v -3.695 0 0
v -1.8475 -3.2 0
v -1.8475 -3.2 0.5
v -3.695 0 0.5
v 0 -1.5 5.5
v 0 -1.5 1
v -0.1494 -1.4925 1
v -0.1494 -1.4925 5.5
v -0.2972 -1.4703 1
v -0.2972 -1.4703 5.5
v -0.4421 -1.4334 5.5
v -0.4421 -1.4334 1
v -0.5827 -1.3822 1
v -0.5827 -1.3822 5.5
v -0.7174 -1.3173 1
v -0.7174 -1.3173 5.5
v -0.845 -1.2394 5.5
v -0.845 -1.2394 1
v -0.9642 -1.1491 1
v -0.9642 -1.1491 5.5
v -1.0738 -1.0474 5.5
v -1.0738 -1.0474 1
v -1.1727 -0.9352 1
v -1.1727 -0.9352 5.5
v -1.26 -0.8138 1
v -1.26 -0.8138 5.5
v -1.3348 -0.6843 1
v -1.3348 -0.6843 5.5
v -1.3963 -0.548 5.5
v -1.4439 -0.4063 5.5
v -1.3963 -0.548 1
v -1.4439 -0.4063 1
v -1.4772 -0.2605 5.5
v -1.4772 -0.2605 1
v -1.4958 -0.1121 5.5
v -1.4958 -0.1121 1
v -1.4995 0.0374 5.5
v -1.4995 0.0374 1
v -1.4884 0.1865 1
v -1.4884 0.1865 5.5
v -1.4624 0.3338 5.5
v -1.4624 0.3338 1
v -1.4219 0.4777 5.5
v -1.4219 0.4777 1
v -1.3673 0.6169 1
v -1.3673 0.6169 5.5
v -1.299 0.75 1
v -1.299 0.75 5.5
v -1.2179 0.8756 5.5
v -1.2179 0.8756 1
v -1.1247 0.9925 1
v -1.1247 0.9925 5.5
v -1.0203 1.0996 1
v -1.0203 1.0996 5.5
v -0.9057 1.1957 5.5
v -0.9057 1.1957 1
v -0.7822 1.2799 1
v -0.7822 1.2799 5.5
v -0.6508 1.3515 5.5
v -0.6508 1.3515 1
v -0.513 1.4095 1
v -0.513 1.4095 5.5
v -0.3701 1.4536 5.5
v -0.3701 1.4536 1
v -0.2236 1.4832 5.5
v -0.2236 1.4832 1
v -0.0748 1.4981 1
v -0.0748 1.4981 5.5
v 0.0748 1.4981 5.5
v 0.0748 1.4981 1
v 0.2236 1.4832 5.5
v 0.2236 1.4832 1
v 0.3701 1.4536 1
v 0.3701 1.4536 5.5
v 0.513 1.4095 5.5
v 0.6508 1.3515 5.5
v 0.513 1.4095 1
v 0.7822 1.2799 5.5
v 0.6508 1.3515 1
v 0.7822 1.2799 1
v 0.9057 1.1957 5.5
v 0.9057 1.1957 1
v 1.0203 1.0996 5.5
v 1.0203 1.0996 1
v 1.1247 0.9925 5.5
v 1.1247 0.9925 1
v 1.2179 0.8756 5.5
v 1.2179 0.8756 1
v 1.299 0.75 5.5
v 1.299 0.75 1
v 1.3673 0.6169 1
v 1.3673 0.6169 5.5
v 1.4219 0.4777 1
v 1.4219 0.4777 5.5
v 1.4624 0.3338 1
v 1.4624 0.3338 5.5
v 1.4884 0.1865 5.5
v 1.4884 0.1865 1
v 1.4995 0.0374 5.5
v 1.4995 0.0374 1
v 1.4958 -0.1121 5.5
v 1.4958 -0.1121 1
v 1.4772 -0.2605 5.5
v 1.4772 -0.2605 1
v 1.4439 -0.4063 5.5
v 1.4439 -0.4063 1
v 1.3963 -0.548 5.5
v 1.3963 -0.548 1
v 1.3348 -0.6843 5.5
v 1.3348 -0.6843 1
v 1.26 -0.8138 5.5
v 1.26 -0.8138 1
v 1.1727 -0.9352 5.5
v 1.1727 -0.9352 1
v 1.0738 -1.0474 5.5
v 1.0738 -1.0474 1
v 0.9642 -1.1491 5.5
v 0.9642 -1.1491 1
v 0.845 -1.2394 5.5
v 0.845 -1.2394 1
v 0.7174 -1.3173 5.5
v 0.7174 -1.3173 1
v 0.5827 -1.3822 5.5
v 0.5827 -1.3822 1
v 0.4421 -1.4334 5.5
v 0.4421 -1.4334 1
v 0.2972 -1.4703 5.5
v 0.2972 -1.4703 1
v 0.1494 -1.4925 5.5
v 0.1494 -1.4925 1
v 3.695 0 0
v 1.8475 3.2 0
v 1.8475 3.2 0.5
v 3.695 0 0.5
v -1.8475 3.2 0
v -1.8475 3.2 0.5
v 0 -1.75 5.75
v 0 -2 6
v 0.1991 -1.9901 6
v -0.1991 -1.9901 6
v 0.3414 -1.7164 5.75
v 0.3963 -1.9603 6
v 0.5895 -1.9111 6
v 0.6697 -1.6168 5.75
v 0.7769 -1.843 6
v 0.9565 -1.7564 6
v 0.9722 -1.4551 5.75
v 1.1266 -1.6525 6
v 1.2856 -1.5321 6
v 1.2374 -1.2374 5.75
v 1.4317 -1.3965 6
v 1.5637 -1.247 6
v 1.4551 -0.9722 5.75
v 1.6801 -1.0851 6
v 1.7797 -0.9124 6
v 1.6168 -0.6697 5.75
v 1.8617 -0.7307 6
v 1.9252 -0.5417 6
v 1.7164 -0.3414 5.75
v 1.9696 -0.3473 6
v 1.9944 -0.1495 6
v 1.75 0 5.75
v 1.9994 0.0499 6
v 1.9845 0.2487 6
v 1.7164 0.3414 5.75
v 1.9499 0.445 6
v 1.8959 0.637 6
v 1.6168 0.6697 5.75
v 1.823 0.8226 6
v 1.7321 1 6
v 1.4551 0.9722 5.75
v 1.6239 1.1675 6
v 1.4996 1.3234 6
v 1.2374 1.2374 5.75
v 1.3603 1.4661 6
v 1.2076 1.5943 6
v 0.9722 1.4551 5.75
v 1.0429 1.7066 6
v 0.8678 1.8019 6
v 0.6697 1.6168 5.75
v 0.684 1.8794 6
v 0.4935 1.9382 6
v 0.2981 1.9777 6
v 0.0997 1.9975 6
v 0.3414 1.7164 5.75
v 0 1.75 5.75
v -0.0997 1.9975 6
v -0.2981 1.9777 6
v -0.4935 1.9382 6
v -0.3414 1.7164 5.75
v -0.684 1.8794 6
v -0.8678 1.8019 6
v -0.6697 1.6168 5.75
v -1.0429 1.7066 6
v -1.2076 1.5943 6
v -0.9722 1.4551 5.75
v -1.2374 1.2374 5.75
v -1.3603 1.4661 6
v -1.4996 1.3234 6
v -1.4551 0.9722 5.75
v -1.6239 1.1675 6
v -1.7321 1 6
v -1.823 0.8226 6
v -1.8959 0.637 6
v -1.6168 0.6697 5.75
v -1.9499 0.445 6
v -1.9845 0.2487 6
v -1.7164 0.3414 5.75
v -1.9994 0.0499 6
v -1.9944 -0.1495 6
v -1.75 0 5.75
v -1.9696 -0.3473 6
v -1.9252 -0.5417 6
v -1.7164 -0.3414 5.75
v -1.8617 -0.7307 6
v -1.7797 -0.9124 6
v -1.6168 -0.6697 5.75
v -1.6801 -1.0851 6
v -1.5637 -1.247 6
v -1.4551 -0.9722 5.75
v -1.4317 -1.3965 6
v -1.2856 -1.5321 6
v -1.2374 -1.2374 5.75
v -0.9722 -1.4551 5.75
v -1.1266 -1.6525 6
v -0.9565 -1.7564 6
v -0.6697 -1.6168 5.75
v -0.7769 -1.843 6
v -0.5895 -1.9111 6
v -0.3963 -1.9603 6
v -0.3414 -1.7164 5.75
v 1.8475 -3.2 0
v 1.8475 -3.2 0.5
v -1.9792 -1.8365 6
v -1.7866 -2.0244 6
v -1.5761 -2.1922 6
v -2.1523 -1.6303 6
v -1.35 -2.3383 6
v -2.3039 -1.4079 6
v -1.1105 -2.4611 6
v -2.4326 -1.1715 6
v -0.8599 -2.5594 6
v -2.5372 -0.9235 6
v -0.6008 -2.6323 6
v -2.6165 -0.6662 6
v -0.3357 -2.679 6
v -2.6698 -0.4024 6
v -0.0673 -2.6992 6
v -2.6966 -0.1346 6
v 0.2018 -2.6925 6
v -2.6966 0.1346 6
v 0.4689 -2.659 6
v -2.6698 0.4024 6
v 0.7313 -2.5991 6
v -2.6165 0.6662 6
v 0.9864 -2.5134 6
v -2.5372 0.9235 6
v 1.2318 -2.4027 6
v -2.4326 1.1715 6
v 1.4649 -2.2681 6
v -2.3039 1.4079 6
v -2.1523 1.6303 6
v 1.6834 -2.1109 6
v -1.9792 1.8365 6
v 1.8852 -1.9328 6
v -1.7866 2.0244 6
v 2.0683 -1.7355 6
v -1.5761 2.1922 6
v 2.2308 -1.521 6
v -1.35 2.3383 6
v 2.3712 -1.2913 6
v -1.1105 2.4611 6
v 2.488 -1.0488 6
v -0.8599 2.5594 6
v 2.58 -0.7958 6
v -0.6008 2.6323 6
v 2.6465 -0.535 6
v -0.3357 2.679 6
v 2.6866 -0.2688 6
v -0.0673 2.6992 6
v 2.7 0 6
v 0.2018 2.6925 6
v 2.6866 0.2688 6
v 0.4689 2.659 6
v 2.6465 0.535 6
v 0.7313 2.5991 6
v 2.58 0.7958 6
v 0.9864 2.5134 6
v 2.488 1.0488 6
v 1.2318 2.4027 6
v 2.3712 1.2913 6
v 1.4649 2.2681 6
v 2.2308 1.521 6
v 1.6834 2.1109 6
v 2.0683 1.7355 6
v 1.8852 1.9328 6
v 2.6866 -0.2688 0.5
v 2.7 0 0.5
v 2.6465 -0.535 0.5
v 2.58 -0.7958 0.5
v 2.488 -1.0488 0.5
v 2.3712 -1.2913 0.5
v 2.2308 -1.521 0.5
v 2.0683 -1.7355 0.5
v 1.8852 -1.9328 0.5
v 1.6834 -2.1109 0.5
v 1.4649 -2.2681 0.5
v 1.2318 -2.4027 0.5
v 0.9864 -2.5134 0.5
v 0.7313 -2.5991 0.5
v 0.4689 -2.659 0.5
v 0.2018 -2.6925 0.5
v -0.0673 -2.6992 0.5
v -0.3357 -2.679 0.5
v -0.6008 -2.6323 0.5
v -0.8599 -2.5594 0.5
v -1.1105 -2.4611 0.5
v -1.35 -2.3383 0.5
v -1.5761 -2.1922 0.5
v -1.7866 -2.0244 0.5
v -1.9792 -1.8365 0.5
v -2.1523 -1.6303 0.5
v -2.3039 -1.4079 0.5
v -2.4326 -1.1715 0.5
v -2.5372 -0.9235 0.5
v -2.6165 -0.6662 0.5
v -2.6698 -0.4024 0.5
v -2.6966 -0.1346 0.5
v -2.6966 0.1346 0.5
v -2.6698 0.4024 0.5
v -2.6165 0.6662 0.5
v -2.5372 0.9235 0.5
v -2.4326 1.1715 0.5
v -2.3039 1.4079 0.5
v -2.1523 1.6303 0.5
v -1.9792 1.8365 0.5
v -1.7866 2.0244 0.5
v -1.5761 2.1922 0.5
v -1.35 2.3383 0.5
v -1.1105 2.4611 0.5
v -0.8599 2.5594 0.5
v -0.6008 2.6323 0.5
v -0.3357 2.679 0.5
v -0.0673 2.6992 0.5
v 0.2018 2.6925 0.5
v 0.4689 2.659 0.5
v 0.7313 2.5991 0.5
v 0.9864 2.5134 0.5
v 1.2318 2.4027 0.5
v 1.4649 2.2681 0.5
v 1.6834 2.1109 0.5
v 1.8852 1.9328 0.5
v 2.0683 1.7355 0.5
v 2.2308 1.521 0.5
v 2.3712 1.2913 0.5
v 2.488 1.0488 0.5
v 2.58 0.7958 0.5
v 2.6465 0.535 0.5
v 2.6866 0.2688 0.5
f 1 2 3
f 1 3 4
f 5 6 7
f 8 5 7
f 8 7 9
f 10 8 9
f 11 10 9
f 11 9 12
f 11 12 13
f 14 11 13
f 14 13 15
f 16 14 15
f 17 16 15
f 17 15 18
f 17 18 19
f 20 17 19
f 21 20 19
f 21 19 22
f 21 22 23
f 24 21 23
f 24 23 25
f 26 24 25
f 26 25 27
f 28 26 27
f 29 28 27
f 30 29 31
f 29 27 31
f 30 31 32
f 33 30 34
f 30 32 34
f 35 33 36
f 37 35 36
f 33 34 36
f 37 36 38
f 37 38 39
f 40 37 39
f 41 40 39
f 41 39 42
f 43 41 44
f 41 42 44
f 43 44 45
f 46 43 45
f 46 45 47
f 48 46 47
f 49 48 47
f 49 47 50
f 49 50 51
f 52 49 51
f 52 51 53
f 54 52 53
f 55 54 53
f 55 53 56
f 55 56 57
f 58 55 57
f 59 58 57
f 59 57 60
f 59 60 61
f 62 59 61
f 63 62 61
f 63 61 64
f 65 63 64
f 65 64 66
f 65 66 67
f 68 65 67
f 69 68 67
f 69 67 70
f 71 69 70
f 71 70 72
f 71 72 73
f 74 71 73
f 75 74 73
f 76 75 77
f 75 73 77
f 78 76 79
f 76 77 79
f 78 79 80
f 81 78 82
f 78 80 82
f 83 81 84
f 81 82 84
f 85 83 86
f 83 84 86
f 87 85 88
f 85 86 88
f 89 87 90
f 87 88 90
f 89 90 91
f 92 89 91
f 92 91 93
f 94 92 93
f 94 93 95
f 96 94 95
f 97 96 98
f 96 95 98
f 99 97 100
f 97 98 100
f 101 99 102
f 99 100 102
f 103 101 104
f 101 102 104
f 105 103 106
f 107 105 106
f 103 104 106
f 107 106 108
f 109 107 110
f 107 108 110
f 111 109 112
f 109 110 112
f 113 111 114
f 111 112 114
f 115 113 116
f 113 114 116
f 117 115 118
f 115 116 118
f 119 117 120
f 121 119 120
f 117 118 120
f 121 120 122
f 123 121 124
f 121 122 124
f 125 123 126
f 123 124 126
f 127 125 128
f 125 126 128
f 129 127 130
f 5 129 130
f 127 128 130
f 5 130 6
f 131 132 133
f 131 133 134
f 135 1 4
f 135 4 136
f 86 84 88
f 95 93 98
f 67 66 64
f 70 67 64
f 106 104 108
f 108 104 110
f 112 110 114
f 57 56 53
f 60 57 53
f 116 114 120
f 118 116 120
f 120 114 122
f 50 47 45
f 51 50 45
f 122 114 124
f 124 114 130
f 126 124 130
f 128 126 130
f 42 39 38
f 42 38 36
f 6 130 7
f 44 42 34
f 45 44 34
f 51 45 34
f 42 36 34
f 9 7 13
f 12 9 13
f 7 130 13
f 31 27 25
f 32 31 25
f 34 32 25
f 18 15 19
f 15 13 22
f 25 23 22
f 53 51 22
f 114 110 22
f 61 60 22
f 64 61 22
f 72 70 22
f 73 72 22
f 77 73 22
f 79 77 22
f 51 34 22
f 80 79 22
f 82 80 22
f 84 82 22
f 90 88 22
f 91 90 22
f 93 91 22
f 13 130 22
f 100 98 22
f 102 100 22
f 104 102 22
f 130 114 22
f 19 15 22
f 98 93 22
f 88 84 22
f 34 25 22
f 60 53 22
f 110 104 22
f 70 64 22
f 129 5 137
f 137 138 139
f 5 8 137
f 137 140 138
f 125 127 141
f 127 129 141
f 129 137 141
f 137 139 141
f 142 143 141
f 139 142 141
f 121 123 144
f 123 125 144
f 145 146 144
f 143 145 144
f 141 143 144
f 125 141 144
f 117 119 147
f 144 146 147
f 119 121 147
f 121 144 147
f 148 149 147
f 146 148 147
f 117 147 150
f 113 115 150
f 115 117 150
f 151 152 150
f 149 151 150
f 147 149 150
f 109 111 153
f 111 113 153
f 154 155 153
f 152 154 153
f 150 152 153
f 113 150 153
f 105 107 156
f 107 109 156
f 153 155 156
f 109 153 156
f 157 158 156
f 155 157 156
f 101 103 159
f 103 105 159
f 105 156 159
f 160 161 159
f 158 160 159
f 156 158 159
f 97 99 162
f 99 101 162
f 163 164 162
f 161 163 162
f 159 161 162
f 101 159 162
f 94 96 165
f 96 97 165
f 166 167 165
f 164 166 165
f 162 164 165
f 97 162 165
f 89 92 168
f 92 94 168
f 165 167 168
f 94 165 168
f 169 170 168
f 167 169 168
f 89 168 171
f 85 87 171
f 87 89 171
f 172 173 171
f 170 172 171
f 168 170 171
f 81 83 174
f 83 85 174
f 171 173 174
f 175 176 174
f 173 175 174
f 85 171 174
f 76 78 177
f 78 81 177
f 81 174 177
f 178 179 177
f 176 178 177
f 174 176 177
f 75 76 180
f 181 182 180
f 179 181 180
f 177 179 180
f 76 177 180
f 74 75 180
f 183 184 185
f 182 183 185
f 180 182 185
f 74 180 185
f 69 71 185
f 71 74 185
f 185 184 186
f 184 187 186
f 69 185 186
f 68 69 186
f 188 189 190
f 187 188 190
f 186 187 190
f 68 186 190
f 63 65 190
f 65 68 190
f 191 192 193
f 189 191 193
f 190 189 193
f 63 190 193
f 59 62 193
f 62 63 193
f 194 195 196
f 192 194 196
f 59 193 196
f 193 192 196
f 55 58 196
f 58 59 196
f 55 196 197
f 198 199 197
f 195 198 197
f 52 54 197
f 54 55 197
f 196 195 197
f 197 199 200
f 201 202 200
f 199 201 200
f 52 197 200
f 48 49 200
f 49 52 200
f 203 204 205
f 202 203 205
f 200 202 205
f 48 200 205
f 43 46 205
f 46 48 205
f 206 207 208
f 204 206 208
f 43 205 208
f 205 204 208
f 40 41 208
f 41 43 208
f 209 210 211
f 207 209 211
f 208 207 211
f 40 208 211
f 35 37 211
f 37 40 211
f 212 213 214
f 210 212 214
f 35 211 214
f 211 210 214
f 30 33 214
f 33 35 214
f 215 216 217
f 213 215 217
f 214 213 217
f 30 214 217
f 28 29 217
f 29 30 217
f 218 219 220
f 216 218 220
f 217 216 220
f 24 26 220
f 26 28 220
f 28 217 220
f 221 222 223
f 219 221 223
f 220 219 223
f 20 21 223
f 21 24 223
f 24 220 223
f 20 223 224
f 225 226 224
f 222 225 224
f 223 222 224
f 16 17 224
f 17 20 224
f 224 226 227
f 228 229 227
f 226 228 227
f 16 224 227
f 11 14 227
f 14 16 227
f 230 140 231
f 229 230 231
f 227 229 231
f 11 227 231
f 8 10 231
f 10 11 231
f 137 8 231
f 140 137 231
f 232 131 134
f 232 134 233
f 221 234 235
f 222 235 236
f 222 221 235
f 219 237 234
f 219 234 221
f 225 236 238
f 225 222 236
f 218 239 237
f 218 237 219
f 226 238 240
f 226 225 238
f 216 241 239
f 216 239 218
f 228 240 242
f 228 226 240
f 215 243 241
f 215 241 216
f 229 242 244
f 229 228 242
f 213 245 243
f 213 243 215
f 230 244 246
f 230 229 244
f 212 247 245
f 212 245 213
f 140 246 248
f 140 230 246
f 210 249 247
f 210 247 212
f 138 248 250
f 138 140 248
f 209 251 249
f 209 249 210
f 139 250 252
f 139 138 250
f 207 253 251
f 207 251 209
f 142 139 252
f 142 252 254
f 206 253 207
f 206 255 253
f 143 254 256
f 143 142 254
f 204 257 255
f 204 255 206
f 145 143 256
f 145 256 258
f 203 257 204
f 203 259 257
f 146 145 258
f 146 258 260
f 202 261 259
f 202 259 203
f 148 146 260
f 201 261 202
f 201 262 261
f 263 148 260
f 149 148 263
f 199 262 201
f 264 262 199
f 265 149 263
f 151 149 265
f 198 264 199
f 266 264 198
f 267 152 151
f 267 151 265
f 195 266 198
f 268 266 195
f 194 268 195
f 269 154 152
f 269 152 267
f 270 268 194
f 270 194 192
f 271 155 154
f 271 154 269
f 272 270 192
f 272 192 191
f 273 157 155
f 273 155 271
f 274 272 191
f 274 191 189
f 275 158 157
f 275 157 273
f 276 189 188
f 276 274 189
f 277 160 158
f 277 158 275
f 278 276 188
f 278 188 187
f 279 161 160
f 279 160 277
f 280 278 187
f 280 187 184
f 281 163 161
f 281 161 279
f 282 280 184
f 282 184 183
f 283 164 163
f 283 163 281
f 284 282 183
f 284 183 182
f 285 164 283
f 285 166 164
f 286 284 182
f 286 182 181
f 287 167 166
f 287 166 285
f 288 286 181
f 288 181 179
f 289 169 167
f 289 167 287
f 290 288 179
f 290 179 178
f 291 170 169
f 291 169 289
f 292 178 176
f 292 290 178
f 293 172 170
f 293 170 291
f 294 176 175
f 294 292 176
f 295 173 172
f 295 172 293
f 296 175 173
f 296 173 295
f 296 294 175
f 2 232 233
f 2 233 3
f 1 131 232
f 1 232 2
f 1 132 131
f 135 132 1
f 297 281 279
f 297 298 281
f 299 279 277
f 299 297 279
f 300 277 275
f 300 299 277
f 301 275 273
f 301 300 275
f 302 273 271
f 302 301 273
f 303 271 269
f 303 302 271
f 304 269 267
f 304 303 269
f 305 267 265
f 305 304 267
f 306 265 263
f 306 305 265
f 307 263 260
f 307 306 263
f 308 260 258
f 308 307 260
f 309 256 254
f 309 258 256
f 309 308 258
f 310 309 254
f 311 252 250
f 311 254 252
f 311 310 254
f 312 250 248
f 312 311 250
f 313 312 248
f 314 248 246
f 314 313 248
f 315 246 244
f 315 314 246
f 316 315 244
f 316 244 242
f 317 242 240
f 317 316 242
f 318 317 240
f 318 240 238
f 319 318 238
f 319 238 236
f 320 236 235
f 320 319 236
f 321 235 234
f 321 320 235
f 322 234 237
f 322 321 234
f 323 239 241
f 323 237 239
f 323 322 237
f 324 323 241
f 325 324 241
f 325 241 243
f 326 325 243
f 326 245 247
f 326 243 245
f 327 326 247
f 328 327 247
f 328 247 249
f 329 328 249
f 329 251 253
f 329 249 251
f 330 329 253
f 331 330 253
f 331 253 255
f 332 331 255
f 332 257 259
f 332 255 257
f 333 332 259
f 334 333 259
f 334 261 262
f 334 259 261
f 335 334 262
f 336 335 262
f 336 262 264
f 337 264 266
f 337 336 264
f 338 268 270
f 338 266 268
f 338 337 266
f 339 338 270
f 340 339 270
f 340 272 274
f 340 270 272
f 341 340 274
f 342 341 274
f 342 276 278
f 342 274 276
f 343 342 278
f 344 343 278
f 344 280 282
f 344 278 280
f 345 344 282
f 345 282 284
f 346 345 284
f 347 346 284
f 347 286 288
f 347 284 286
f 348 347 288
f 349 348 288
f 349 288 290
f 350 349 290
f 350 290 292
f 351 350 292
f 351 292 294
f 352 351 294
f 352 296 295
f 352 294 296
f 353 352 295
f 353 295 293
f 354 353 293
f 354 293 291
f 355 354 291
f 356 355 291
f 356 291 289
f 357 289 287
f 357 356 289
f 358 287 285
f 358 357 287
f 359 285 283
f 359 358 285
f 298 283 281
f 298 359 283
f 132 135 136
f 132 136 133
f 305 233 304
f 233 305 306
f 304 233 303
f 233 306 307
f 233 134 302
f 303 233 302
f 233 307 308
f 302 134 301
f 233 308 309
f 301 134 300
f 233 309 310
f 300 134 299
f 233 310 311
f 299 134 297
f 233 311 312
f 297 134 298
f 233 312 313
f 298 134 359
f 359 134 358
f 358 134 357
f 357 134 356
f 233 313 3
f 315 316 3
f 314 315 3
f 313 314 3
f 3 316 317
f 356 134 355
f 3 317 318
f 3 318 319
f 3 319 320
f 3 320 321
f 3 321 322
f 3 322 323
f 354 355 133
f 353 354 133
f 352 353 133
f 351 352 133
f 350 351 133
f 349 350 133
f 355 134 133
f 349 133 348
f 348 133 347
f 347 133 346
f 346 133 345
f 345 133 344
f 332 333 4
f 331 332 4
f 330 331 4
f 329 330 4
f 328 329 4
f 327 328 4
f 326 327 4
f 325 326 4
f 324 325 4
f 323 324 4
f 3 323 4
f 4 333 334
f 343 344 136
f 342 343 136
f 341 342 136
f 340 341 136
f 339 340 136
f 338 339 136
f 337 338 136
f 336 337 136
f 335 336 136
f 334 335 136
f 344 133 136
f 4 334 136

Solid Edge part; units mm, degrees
sketch "Sketch1" plane through (0, 0, 0) normal (0, 0, 1) x (1, 0, 0)
  line L0 (-1.8475, 3.2) -> (1.8475, 3.2)
  line L1 (1.8475, 3.2) -> (3.695, 0)
  line L2 (3.695, 0) -> (1.8475, -3.2)
  line L3 (1.8475, -3.2) -> (-1.8475, -3.2)
  line L4 (-1.8475, -3.2) -> (-3.695, 0)
  line L5 (-3.695, 0) -> (-1.8475, 3.2)
  dimension "D1" = 6.4
extrude "Protrusion1" add sketch "Sketch1" along normal blind 0.5
sketch "Sketch2" plane through (0, 0, 0.5) normal (0, 0, 1) x (1, 0, 0)
  circle A0 centre (0, 0) radius 2.7
  dimension "D1" = 5.4
extrude "Ausprägung_2" add sketch "Sketch2" along normal blind 5.5
hole "Bohrung_1" at (0, 0, 6) direction (0, 0, -1) diameter 3 depth 5
chamfer "Fase_1" distance 0.5 angle 45 1 edges at (0, 1.5, 6)
